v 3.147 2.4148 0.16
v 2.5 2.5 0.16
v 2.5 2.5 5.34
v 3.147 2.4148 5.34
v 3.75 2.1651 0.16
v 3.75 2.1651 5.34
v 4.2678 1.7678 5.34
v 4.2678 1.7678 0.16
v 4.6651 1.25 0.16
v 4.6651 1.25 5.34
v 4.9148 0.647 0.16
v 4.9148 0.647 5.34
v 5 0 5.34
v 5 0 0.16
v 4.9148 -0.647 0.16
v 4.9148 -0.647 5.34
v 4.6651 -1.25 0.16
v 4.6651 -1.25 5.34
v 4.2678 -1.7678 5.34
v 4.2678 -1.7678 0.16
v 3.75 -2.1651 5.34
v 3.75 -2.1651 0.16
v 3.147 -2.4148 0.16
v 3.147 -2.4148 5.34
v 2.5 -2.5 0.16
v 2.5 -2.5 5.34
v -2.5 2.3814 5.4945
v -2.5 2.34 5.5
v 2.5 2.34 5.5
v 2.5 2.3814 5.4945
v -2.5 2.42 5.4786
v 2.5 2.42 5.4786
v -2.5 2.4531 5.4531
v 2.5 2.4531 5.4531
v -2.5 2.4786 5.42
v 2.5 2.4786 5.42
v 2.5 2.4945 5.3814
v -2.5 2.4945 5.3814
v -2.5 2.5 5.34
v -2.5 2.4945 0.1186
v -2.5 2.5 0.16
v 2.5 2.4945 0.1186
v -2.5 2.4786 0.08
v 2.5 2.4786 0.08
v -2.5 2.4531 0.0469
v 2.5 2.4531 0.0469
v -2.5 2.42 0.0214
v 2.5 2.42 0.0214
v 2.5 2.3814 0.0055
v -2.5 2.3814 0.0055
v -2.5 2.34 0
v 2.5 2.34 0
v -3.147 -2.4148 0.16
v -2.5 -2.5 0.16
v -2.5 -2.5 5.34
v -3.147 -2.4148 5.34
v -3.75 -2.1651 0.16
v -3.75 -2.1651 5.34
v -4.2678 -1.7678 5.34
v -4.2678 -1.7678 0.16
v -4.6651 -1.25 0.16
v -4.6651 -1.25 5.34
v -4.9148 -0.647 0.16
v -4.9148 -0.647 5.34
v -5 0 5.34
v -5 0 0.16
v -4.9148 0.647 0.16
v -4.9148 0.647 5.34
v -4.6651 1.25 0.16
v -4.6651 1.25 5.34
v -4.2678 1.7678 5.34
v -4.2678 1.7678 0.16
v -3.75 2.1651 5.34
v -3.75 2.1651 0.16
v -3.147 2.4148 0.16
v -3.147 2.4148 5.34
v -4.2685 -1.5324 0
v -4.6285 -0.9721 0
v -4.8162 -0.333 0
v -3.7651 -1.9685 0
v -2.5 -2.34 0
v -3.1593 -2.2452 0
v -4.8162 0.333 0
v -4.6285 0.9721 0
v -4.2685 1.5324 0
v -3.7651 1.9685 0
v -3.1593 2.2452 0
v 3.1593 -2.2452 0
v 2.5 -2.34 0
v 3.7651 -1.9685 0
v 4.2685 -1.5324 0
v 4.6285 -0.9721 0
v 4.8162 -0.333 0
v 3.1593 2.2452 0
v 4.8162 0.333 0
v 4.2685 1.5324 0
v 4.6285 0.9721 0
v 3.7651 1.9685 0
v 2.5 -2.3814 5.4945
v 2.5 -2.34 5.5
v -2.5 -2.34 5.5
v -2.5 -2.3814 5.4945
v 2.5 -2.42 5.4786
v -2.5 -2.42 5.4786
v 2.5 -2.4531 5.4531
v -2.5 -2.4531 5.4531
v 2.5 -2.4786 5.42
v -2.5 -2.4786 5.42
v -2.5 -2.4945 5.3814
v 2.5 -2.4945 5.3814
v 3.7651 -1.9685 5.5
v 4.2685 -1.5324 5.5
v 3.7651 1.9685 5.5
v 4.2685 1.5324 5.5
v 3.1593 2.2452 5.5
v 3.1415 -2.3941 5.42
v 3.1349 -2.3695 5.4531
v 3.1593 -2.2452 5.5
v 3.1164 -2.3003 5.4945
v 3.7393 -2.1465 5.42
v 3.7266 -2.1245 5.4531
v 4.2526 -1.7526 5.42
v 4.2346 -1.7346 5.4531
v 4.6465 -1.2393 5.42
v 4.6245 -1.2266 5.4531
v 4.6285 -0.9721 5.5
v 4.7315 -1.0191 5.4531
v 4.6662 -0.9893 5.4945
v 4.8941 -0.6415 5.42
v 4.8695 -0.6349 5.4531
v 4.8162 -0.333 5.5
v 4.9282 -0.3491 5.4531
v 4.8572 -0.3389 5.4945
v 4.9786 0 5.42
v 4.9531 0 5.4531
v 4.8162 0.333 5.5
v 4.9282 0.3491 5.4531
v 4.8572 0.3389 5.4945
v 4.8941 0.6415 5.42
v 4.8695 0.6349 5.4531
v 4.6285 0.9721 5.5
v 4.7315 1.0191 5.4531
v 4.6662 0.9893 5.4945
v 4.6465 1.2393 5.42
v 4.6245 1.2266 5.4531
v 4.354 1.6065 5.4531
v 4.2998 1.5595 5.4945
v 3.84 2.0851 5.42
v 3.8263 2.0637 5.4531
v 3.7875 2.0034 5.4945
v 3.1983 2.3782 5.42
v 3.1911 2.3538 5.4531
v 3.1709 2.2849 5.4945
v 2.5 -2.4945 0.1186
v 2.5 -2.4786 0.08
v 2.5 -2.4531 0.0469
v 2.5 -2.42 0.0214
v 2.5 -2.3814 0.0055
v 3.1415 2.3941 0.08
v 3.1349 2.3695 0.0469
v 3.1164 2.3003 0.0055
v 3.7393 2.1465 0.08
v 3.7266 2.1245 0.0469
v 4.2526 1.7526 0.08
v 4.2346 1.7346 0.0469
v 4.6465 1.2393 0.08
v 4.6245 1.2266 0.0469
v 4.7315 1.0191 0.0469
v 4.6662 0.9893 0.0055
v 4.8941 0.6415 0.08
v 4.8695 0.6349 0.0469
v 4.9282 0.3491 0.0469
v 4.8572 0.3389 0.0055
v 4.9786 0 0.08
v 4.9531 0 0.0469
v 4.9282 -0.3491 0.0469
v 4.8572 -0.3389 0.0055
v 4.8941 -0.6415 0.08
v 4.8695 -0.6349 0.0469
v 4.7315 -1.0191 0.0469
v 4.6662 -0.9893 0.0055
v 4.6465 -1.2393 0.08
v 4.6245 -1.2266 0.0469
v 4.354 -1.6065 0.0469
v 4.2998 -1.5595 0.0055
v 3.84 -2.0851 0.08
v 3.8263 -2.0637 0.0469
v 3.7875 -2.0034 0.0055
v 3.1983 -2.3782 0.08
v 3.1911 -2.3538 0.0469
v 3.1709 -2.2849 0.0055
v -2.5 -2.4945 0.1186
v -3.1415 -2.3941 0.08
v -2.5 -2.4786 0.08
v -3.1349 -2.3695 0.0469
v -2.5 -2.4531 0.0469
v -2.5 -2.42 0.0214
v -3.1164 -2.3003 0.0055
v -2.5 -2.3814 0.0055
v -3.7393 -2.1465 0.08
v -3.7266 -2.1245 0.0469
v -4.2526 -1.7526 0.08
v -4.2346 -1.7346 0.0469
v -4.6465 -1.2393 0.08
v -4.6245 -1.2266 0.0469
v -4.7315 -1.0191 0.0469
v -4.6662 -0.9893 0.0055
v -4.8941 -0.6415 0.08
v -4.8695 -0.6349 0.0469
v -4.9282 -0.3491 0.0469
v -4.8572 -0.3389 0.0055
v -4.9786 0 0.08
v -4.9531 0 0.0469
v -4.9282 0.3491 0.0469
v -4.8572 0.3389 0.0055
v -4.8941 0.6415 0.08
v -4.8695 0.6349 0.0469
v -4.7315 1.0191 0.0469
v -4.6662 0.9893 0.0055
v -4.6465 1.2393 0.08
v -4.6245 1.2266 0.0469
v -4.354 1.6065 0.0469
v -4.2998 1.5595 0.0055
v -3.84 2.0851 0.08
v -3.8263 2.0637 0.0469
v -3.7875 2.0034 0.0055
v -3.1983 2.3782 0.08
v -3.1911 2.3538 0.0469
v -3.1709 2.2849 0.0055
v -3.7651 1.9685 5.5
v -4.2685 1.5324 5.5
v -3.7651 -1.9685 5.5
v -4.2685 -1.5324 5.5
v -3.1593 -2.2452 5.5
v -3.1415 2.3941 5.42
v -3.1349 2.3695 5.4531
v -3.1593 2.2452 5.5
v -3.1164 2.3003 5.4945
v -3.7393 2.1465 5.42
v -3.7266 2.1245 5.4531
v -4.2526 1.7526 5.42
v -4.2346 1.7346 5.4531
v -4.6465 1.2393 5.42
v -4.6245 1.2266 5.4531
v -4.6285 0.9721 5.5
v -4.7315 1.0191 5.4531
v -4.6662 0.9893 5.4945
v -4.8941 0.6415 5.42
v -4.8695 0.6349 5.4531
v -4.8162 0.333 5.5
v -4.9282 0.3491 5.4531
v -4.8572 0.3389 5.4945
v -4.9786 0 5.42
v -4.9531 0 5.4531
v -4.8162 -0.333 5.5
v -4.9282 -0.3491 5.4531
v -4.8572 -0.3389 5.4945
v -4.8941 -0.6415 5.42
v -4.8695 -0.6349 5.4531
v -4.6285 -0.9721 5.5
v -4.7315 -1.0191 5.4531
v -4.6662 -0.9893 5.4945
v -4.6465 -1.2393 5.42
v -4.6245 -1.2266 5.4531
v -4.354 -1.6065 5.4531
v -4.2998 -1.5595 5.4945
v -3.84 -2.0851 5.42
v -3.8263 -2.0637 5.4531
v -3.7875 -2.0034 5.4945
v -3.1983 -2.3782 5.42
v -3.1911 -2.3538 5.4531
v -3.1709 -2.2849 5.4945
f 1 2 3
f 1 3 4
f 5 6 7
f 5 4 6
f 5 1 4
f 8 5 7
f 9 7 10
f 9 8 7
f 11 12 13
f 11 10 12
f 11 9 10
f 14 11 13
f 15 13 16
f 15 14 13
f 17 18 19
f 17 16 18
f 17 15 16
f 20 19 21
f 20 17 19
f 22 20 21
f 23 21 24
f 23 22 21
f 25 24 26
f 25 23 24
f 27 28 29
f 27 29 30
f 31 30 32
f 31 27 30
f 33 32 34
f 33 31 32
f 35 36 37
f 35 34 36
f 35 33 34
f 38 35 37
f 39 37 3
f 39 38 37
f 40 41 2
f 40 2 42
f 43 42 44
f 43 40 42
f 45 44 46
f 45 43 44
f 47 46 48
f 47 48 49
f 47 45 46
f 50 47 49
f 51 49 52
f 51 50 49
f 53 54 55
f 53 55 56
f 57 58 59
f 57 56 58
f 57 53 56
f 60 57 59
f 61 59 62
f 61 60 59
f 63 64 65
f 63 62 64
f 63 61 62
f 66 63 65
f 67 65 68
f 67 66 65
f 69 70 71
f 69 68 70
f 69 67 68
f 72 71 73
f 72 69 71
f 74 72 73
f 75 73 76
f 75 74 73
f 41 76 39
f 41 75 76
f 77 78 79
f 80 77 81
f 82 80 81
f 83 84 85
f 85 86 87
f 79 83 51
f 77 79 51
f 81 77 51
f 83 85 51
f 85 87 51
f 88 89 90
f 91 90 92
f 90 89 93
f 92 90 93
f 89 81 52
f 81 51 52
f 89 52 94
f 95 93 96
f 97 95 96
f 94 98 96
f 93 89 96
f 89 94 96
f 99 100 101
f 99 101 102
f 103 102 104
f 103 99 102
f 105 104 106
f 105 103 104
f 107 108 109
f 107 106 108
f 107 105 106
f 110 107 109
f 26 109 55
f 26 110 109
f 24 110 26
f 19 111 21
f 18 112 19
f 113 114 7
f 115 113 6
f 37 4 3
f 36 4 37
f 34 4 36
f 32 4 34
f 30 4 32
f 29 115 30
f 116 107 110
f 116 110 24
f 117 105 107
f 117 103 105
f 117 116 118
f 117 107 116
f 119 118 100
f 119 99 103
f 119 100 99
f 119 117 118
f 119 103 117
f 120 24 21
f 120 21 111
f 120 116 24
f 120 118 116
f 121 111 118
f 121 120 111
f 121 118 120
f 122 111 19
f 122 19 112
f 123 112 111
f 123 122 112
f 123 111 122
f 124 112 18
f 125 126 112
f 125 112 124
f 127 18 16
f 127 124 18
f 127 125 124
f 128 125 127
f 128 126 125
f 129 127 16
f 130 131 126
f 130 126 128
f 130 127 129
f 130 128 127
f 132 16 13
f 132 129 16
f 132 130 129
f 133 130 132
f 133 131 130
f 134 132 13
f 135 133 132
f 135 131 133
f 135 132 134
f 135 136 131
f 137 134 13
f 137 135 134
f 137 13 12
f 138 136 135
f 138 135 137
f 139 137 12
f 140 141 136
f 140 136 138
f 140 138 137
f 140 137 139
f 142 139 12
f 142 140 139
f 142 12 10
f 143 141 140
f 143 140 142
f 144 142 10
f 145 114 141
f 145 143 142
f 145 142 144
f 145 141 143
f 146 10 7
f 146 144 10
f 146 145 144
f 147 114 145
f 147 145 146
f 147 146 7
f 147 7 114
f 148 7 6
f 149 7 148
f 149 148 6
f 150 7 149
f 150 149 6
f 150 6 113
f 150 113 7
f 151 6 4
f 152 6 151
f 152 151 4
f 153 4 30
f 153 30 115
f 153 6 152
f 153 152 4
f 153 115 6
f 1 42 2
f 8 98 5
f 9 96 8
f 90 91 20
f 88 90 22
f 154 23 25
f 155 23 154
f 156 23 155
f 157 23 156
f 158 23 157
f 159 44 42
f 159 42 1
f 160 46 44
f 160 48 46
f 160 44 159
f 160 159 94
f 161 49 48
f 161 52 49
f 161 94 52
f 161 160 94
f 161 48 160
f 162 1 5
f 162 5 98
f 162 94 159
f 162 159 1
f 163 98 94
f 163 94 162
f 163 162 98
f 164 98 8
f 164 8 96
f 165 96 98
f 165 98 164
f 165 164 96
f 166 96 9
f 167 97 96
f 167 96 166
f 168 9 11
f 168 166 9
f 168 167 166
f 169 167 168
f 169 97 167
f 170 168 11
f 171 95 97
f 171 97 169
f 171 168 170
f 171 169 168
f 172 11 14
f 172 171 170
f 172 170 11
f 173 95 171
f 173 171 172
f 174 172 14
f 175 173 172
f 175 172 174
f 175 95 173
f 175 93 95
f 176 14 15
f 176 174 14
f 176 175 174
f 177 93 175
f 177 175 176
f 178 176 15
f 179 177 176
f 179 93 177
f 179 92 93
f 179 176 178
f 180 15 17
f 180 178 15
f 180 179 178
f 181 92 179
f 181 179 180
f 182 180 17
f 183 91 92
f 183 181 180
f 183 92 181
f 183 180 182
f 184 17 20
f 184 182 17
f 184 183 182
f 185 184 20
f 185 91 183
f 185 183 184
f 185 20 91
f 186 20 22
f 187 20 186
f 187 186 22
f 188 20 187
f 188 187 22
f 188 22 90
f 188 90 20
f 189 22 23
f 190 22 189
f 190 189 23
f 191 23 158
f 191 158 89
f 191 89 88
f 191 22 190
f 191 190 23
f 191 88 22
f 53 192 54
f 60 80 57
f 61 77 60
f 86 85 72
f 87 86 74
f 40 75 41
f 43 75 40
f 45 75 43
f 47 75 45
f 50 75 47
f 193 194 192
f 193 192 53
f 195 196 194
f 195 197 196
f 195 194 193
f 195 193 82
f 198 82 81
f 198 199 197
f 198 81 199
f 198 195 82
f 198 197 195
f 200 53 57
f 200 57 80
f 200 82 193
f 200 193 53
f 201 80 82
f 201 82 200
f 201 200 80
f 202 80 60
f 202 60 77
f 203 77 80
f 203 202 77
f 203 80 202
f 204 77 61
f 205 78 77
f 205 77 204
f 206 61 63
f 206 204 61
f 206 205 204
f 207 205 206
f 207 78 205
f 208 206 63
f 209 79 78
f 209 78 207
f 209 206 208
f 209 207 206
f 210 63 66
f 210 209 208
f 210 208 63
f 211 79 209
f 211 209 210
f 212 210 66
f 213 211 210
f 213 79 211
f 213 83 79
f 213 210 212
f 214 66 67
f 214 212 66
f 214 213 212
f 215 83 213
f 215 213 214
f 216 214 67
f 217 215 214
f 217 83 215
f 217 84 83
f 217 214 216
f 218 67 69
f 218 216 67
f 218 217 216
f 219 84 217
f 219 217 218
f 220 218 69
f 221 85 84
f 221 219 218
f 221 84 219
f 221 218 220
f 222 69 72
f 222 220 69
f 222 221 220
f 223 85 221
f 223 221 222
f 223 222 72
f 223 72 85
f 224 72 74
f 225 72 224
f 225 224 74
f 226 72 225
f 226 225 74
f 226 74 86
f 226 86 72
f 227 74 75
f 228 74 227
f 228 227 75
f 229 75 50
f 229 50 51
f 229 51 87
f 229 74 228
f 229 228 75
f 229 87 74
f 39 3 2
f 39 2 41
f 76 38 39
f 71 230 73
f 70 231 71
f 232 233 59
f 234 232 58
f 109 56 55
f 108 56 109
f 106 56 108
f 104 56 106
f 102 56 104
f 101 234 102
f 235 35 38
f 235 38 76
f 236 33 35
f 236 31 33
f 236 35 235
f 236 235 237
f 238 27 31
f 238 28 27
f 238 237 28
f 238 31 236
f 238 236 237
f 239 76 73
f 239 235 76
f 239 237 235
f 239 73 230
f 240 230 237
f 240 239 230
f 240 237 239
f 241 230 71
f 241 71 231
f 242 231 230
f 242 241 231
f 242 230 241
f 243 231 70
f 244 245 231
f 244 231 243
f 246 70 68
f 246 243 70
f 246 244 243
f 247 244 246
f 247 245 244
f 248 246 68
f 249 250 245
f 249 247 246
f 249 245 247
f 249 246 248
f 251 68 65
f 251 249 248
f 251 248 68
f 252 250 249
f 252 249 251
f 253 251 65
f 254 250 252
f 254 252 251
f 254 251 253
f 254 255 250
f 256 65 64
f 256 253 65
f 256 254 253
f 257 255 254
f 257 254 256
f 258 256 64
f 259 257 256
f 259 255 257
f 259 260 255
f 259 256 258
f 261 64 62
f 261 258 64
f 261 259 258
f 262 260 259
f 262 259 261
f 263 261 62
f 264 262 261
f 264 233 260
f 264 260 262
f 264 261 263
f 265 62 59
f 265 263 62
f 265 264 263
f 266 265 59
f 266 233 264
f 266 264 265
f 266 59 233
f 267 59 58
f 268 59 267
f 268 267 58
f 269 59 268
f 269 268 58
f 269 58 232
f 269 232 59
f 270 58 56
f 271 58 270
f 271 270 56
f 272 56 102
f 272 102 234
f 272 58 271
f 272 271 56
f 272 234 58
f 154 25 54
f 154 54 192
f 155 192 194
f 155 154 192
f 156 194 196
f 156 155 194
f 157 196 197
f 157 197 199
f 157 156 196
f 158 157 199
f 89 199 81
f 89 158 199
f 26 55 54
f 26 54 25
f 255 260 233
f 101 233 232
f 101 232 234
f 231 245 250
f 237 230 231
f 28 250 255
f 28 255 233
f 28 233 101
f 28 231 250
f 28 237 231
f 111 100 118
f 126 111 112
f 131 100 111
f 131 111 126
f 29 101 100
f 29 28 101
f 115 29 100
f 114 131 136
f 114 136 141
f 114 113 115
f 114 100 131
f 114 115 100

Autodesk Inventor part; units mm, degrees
ref_plane "YZ Plane" through (0, 0, 0) normal (1, 0, 0) x (0, 1, 0)
ref_plane "XZ Plane" through (0, 0, 0) normal (0, 1, 0) x (-1, 0, 0)
ref_plane "XY Plane" through (0, 0, 0) normal (0, 0, 1) x (1, 0, 0)
sketch "草圖1" plane through (0, 0, 0) normal (0, 0, 1) x (1, 0, 0)
  line L0 (-2.5, -2.5) -> (2.5, -2.5)
  line L1 (2.5, -2.5) -> (2.5, 2.5)
  line L2 (2.5, 2.5) -> (-2.5, 2.5)
  line L3 (-2.5, 2.5) -> (-2.5, -2.5)
  line L4 (-2.5, -2.5) -> (2.5, 2.5) construction
  line L5 (2.5, -2.5) -> (-2.5, 2.5) construction
  arc A0 (2.5, -2.5) -> (2.5, 2.5) centre (2.5, 0) ccw
  arc A1 (-2.5, 2.5) -> (-2.5, -2.5) centre (-2.5, 0) ccw
  point P0 (0, 0)
  dimension "d0" = 5
  dimension "d1" = 5
extrude "擠出1" add sketch "草圖1" along normal blind 5.5
fillet "圓角1" radius 0.16 8 edges at (-5, 0, 5.5) (0, -2.5, 5.5) (5, 0, 5.5) (0, 2.5, 5.5) (-5, 0, 0) (0, -2.5, 0) (5, 0, 0) (0, 2.5, 0)
properties part number "key_sun2"
